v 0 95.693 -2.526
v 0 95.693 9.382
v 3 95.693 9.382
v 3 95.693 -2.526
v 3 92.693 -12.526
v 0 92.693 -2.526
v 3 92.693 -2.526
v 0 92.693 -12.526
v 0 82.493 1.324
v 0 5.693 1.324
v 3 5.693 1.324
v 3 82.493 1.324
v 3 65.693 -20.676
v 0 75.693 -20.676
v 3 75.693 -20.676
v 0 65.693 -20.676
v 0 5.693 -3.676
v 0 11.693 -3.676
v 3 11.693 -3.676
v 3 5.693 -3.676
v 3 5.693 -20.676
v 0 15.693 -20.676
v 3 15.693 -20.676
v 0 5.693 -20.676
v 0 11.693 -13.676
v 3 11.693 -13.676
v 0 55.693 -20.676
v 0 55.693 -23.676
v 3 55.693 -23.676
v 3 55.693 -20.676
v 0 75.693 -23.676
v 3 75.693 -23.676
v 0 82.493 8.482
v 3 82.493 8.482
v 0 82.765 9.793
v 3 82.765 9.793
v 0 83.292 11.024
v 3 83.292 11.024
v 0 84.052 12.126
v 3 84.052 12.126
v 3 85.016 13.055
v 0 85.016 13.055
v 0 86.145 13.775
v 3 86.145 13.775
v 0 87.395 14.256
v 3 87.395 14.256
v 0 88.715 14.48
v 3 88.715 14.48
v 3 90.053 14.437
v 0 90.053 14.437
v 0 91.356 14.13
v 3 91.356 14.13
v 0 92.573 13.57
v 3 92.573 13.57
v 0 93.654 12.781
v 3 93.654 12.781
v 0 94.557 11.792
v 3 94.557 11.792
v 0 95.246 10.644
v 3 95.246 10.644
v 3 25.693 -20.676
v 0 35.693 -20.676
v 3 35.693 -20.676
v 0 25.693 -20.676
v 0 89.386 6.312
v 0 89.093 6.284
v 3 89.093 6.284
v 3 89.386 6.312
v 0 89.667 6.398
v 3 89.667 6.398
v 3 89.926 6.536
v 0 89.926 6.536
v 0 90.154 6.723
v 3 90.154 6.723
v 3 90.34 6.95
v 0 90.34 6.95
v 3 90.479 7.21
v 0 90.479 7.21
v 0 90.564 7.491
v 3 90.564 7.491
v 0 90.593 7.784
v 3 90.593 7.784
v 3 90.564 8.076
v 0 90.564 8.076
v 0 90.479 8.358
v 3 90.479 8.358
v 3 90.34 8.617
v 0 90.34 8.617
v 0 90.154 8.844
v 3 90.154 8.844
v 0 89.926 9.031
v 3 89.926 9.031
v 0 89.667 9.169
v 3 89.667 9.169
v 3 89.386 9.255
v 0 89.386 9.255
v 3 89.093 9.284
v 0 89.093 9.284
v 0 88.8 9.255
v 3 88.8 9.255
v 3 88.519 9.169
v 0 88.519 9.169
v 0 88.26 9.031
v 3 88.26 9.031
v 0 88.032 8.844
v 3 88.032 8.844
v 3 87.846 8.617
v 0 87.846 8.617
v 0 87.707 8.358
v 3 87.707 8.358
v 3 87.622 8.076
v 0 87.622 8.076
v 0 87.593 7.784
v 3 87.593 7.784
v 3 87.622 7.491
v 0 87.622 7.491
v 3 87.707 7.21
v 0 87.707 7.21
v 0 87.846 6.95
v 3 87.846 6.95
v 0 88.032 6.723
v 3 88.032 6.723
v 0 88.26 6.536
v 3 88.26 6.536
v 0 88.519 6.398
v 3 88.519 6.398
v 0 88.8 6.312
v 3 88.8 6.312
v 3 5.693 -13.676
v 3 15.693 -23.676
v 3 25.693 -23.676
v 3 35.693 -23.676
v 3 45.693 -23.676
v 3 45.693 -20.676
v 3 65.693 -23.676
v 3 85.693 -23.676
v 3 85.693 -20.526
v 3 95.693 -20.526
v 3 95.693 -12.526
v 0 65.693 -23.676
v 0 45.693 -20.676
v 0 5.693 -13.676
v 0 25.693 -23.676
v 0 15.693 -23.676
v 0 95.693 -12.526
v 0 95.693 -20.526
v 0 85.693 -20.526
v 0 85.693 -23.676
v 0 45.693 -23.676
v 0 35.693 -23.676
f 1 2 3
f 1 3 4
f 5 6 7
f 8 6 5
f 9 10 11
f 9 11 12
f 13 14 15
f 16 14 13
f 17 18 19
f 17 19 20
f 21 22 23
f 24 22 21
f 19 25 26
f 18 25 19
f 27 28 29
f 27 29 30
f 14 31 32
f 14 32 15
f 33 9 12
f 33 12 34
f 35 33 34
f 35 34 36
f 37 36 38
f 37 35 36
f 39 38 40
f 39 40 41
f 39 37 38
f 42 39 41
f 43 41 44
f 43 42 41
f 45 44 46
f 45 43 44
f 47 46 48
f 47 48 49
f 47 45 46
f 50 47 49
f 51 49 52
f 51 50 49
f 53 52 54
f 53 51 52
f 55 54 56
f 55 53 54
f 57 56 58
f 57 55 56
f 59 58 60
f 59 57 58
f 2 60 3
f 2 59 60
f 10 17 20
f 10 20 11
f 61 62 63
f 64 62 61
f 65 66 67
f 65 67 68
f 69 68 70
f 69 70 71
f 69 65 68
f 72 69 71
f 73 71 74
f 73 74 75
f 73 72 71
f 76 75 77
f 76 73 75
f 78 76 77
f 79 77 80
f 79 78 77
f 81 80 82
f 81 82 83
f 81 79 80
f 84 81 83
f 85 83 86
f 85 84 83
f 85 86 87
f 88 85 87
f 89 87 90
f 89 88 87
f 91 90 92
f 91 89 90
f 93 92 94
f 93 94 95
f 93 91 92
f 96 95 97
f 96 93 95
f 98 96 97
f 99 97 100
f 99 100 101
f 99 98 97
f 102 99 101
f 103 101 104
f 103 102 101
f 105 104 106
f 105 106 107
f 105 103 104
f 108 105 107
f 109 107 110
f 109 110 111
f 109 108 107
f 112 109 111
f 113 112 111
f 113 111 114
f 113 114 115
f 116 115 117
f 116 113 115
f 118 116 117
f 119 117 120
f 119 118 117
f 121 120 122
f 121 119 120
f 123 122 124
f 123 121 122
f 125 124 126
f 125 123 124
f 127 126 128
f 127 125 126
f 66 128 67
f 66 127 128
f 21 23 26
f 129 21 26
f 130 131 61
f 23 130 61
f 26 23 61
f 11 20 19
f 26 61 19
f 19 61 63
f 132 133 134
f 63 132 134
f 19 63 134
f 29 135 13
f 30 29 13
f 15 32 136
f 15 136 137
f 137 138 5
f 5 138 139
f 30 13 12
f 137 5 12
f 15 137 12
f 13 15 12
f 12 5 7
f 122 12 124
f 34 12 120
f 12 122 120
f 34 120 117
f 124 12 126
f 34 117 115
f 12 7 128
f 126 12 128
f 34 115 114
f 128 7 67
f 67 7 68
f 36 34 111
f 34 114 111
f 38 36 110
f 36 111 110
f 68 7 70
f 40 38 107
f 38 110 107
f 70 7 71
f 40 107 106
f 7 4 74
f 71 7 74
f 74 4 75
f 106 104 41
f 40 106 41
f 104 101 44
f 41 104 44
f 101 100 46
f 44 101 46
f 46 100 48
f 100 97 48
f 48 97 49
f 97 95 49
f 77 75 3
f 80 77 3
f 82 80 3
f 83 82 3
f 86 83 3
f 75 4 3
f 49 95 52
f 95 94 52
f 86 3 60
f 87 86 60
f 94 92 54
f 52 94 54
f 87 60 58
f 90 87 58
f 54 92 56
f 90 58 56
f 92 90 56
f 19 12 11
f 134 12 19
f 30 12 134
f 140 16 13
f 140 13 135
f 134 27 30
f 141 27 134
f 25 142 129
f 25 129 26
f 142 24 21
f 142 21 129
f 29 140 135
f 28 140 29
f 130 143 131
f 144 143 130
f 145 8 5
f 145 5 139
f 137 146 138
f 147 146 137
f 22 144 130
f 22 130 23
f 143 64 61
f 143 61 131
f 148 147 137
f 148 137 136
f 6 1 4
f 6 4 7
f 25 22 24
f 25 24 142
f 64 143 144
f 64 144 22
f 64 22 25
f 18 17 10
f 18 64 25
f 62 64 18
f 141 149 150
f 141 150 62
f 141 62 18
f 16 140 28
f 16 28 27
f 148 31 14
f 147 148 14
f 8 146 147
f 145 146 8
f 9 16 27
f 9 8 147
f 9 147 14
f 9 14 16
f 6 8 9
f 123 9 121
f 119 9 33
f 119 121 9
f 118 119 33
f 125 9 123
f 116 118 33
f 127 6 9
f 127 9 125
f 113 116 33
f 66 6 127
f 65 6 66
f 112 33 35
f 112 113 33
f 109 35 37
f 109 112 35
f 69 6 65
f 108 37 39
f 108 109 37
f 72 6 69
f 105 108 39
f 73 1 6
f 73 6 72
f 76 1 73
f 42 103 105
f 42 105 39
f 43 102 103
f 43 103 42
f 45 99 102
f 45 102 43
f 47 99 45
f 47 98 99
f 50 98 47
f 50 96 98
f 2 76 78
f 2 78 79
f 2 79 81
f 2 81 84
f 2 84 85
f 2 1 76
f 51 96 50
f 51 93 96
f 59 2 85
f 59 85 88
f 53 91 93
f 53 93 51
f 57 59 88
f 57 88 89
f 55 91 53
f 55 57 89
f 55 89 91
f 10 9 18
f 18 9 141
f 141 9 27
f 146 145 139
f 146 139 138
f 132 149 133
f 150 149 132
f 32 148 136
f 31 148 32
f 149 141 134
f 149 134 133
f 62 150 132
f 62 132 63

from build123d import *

# Parameters (mm, degrees)
SKETCH1_R           = 1.5
BOSS_EXTRUDE1_DEPTH = 3


with BuildPart() as part:
    # Sketch1 → Boss-Extrude1 (new body)
    with BuildSketch(Plane(origin=(0, 0, 0), x_dir=(0, 0, -1), z_dir=(1, 0, 0))):
        with BuildLine():
            Line((-9.38169605, 95.692985903), (-1.06418499, 95.692985903))
            Line((-1.06418499, 95.692985903), (2.525652309, 95.692985903))
            Line((2.525652309, 95.692985903), (2.525652309, 92.692985903))
            Line((2.525652309, 92.692985903), (12.525652309, 92.692985903))
            Line((12.525652309, 92.692985903), (12.525652309, 95.692985903))
            Line((12.525652309, 95.692985903), (20.525652309, 95.692985903))
            Line((20.525652309, 95.692985903), (20.525652309, 85.692985903))
            Line((20.525652309, 85.692985903), (23.675577753, 85.692985903))
            Line((23.675577753, 85.692985903), (23.675577753, 75.692985903))
            Line((23.675577753, 75.692985903), (20.675577753, 75.692985903))
            Line((20.675577753, 75.692985903), (20.675577753, 65.692985903))
            Line((20.675577753, 65.692985903), (23.675577753, 65.692985903))
            Line((23.675577753, 65.692985903), (23.675577753, 55.692985903))
            Line((23.675577753, 55.692985903), (20.675577753, 55.692985903))
            Line((20.675577753, 55.692985903), (20.675577753, 45.692985903))
            Line((20.675577753, 45.692985903), (23.675577753, 45.692985903))
            Line((23.675577753, 45.692985903), (23.675577753, 35.692985903))
            Line((23.675577753, 35.692985903), (20.675577753, 35.692985903))
            Line((20.675577753, 35.692985903), (20.675577753, 25.692985903))
            Line((20.675577753, 25.692985903), (23.675577753, 25.692985903))
            Line((23.675577753, 25.692985903), (23.675577753, 15.692985903))
            Line((23.675577753, 15.692985903), (20.675577753, 15.692985903))
            Line((20.675577753, 15.692985903), (20.675577753, 5.692985903))
            Line((20.675577753, 5.692985903), (13.675577753, 5.692985903))
            Line((13.675577753, 5.692985903), (13.675577753, 11.692985903))
            Line((13.675577753, 11.692985903), (3.675577753, 11.692985903))
            Line((3.675577753, 11.692985903), (3.675577753, 5.692985903))
            Line((3.675577753, 5.692985903), (-1.324422247, 5.692985903))
            Line((-1.324422247, 5.692985903), (-1.324422247, 82.492985903))
            Line((-1.324422247, 82.492985903), (-8.482000981, 82.492985903))
            ThreePointArc((-8.482000981, 82.492985903), (-14.479905975, 88.714837423), (-9.38169605, 95.692985903))
        make_face()
        with Locations((-7.783554384, 89.092985903)):
            Circle(SKETCH1_R, mode=Mode.SUBTRACT)
    extrude(amount=BOSS_EXTRUDE1_DEPTH)


solid = part.part
